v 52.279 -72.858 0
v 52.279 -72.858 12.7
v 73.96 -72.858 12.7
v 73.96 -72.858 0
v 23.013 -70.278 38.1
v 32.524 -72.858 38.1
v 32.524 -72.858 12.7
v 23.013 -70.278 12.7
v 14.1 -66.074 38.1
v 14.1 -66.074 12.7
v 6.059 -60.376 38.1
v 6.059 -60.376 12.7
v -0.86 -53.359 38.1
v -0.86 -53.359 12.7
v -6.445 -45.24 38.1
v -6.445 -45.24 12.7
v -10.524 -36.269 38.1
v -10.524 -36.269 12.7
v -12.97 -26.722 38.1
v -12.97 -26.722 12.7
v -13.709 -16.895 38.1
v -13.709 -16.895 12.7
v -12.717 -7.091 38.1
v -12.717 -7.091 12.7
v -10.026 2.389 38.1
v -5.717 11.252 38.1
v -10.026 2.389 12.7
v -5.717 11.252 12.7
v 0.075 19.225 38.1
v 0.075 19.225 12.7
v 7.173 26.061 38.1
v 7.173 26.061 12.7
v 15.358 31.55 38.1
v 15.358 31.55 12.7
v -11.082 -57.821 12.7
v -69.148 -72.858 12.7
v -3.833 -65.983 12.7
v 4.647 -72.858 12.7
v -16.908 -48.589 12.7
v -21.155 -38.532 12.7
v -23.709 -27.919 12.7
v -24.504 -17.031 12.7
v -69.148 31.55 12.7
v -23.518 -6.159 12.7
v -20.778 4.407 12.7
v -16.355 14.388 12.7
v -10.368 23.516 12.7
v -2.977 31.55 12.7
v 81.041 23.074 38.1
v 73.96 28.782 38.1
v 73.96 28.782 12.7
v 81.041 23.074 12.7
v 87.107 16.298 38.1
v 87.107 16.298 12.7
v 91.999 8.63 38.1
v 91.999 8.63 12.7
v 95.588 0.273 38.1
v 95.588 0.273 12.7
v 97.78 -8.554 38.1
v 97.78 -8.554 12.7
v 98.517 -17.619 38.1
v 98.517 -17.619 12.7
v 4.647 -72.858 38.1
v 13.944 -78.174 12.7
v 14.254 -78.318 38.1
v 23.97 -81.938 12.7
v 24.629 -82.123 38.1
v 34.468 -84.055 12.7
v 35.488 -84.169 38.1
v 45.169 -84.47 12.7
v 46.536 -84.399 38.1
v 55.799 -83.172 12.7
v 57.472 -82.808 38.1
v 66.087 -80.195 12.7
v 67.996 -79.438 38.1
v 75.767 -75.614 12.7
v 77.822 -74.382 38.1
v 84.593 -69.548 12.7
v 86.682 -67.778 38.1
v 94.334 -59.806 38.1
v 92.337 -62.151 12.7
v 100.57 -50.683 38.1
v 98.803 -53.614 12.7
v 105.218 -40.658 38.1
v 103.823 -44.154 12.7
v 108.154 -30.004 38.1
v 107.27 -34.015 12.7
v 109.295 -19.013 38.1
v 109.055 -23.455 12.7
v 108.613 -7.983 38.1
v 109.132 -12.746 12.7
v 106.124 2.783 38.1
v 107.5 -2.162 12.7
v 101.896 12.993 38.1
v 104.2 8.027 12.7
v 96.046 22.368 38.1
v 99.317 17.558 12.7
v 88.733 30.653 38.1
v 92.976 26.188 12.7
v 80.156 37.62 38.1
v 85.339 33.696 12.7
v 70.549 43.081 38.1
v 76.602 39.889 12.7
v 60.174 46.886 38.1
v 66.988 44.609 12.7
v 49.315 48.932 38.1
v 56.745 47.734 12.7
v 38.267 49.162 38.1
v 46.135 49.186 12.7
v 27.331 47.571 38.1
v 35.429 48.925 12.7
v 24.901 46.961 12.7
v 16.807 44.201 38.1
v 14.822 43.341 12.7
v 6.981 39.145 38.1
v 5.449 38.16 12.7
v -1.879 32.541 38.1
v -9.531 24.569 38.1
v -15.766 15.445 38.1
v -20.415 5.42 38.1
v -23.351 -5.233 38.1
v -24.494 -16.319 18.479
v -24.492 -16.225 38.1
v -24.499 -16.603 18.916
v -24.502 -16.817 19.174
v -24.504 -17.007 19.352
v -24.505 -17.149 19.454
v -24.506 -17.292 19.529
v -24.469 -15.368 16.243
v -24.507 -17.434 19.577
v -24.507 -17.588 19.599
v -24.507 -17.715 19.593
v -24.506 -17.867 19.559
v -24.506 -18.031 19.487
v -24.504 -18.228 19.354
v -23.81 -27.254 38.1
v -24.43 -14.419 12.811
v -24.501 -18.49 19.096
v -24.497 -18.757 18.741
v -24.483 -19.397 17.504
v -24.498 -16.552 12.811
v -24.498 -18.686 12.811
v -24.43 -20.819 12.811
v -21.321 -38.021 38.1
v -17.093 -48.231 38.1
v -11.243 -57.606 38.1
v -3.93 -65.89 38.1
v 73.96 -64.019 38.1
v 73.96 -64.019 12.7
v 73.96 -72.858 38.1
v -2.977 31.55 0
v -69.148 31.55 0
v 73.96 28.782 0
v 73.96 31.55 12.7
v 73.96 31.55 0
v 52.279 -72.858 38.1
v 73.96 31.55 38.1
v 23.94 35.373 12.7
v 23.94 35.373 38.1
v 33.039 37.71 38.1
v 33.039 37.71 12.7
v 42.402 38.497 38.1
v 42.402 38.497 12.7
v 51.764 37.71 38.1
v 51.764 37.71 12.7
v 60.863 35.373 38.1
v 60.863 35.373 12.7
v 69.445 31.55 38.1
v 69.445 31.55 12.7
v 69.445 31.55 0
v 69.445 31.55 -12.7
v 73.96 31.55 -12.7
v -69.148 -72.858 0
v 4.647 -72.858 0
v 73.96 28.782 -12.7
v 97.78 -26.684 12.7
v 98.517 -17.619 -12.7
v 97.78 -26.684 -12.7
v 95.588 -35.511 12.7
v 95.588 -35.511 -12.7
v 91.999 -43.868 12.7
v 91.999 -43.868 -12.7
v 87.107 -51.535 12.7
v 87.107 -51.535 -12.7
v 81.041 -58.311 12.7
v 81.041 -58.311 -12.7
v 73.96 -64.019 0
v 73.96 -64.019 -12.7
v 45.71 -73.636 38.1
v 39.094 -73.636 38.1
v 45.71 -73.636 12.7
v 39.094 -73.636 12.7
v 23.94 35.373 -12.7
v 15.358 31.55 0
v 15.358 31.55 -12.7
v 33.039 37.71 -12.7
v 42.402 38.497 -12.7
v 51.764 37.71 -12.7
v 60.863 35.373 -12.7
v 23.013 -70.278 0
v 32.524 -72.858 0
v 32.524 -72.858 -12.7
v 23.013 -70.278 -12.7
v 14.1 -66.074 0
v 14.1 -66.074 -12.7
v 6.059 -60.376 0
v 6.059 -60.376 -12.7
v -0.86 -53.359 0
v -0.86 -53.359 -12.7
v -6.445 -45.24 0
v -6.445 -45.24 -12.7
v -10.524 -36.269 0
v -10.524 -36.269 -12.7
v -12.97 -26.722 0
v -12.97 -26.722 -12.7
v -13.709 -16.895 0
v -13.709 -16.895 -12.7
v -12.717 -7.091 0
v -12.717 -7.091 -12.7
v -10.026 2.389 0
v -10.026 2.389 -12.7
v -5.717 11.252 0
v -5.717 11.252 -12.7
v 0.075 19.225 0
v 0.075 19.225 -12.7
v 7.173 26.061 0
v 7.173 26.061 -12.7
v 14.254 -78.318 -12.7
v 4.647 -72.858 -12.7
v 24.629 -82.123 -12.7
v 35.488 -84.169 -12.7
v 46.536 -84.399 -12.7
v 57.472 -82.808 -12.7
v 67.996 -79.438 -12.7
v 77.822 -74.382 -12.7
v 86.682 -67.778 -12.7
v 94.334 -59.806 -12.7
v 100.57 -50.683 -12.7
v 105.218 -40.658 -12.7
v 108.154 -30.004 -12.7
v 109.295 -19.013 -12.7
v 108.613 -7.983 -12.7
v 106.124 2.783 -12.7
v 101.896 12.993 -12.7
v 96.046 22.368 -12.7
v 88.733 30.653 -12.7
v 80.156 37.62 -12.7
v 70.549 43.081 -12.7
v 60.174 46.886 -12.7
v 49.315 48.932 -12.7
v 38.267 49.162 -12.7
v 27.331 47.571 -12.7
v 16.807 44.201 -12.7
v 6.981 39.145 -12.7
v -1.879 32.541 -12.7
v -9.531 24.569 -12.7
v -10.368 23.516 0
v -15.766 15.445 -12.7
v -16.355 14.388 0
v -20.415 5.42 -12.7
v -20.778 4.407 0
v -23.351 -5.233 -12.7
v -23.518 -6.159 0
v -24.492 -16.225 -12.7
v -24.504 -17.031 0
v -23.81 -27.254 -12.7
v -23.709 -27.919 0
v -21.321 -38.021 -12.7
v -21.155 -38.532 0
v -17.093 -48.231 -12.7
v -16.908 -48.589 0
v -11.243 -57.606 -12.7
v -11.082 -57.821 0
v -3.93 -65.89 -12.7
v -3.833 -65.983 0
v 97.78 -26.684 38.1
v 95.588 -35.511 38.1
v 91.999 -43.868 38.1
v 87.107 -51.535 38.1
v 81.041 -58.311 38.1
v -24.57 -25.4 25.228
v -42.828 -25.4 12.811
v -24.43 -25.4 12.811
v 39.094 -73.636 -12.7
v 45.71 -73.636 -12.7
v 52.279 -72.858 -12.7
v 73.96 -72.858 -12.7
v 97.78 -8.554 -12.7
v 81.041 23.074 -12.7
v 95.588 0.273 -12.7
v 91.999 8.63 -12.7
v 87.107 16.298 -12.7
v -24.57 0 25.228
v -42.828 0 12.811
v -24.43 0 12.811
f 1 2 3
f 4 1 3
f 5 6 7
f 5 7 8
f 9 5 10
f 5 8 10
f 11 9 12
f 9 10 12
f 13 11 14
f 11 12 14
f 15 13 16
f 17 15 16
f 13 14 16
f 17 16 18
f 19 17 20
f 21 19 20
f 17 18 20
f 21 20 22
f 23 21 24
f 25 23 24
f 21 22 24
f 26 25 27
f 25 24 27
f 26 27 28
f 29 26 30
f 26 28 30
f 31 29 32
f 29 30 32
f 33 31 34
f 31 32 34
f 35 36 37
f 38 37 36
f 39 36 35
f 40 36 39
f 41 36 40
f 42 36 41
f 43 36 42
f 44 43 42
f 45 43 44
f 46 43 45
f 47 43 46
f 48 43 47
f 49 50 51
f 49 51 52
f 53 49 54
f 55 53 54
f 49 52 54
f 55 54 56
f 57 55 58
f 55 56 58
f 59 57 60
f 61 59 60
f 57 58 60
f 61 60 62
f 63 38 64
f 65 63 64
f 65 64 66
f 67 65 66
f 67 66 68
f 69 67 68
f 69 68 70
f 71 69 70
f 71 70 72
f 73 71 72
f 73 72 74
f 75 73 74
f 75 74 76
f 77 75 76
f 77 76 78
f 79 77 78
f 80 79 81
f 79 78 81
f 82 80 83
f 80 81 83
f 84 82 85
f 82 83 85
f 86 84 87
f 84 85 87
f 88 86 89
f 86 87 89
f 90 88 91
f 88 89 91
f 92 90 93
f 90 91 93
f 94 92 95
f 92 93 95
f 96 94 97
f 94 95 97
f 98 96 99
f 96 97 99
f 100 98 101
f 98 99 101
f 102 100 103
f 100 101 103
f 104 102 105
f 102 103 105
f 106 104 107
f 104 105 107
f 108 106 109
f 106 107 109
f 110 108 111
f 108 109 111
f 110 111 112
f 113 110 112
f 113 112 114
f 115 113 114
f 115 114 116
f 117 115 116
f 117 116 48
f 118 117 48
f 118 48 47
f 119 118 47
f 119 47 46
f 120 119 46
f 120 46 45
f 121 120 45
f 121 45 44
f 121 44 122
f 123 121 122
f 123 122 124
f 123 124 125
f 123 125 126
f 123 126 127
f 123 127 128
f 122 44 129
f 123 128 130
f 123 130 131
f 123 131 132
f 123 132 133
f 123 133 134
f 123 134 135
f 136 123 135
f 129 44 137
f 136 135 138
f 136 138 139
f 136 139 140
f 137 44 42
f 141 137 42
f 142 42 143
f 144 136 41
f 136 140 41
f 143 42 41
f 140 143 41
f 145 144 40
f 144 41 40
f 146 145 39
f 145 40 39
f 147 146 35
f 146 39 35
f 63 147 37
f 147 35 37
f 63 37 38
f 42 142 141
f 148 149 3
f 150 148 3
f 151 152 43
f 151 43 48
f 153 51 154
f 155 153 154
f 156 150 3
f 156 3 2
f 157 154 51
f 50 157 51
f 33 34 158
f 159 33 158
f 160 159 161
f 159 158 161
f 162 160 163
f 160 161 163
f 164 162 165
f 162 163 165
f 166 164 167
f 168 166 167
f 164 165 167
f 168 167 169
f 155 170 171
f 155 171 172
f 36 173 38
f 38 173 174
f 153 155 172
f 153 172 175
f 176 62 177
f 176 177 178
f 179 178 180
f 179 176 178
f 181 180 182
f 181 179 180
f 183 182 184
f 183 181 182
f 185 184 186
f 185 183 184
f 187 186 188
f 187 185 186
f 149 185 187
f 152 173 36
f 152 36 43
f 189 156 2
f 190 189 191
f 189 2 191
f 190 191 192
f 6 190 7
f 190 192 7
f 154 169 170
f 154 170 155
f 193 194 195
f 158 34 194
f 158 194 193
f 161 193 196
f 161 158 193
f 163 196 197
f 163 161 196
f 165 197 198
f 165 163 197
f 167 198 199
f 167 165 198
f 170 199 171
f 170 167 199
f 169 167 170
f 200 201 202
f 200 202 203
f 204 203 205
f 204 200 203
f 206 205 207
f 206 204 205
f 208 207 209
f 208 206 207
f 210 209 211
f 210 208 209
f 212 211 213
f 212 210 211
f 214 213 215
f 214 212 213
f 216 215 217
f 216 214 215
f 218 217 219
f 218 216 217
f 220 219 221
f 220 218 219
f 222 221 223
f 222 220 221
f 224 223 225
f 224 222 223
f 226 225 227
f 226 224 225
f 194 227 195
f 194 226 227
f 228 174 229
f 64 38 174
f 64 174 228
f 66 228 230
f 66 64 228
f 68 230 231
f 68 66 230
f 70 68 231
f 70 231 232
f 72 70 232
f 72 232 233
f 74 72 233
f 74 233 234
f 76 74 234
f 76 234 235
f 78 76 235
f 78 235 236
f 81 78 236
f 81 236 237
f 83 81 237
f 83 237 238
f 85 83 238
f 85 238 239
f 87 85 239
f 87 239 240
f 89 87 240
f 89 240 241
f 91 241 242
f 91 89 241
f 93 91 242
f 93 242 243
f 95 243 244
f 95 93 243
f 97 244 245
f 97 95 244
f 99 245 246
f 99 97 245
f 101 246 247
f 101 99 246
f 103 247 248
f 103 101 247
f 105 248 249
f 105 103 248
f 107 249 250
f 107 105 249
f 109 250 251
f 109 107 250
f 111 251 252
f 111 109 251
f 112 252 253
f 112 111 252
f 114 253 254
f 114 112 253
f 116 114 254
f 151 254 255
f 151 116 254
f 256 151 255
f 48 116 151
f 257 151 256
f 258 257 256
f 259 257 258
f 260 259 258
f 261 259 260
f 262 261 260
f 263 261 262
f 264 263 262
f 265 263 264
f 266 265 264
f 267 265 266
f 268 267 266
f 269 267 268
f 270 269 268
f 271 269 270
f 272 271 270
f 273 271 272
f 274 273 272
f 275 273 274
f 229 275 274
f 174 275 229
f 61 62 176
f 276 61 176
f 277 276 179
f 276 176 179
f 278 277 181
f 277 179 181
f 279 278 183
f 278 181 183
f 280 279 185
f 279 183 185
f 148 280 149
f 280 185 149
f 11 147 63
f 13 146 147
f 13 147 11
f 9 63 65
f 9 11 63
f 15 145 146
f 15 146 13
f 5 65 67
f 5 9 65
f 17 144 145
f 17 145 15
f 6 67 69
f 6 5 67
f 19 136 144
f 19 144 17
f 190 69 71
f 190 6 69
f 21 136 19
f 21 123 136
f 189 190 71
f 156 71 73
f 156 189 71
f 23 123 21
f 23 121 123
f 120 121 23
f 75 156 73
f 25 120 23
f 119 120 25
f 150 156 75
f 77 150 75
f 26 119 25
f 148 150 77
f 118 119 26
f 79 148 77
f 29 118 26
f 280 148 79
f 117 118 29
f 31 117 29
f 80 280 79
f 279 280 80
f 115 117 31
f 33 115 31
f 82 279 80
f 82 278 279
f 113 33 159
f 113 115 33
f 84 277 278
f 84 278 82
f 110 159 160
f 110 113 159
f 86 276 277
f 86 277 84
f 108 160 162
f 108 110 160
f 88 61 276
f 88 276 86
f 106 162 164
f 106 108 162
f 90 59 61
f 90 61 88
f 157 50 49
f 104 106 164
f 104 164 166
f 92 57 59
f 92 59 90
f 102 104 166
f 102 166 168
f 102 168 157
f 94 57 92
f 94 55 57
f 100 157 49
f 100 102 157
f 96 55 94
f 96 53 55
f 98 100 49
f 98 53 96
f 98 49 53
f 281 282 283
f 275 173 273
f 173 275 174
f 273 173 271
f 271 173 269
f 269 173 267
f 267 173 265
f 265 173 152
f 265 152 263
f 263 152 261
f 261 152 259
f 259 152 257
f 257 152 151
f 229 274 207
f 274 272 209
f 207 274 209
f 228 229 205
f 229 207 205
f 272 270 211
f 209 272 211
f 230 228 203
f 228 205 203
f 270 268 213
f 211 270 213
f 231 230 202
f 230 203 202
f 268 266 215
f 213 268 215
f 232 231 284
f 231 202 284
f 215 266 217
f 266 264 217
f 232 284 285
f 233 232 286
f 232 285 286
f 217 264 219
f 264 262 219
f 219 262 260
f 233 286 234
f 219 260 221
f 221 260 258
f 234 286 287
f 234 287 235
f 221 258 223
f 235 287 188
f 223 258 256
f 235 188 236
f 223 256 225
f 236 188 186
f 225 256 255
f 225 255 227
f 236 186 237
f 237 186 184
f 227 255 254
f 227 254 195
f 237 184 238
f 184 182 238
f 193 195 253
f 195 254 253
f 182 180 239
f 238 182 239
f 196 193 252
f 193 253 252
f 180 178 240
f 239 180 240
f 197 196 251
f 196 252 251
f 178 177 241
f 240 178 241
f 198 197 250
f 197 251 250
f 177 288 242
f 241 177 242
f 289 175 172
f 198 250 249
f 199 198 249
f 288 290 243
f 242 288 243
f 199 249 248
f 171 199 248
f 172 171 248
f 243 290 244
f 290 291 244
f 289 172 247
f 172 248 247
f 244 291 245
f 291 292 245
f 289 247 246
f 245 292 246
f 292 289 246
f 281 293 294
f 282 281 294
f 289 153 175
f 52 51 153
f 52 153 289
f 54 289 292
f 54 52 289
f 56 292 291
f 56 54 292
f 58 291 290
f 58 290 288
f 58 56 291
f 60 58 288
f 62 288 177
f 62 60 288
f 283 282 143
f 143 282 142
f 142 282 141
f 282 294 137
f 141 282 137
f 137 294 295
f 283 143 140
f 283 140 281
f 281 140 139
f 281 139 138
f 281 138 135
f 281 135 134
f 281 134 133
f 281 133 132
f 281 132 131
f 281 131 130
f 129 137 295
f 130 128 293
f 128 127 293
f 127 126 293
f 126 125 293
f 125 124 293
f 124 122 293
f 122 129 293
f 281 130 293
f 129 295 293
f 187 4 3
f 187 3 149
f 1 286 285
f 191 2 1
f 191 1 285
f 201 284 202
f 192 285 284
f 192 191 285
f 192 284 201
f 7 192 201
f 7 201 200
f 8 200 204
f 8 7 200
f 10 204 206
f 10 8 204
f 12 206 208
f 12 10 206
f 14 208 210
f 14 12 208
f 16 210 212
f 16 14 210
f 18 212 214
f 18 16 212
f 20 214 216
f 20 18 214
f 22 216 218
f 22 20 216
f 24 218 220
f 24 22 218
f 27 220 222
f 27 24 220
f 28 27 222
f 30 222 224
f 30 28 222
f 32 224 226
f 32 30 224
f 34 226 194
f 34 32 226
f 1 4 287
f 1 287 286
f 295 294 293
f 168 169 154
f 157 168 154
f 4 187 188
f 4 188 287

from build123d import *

# Parameters (mm, degrees)
F0_W          = 143.1075930595
F0_H          = 104.4075153768
F1_DEPTH      = 12.7
F3_DEPTH      = 25.4
F3_DEPTH_BACK = 25.4
F4_DEPTH      = 25.4
F6_DEPTH      = 25.4


with BuildPart() as f1:
    # F0 (on Top) → F1 (new body)
    with BuildSketch(Plane.XY):
        with Locations((2.4059638381, -20.6538233906)):
            Rectangle(F0_W, F0_H)
    extrude(amount=F1_DEPTH)

    # F2 (on face) → F3 (join, two sides)
    with BuildSketch(Plane.XY.offset(12.7)) as f3_sk:
        with BuildLine():
            Line((15.3577672787, 31.5499342978), (-2.9768298588, 31.5499342978))
            ThreePointArc((-2.9768298588, 31.5499342978), (-24.3292867036, -22.491323871), (4.6469989905, -72.857581079))
            Line((4.6469989905, -72.857581079), (32.5235698655, -72.857581079))
            ThreePointArc((32.5235698655, -72.857581079), (-12.9702679448, -26.7224080826), (15.3577672787, 31.5499342978))
        make_face()
        with BuildLine():
            ThreePointArc((4.6469989905, -72.857581079), (73.6316913936, -76.7914525658), (109.3100037632, -17.6186449826))
            ThreePointArc((109.3100037632, -17.6186449826), (69.2394439219, 43.6714076224), (-2.9768298588, 31.5499342978))
            Line((-2.9768298588, 31.5499342978), (15.3577672787, 31.5499342978))
            ThreePointArc((15.3577672787, 31.5499342978), (42.4015261233, 38.4965408489), (69.4452849679, 31.5499342978))
            Line((69.4452849679, 31.5499342978), (73.9597603679, 31.5499342978))
            Line((73.9597603679, 31.5499342978), (73.9597603679, 28.7816991138))
            ThreePointArc((73.9597603679, 28.7816991138), (91.9989568029, 8.6303350143), (98.5167119547, -17.6186449826))
            ThreePointArc((98.5167119547, -17.6186449826), (91.9989568029, -43.8676249794), (73.9597603679, -64.0189890789))
            Line((73.9597603679, -64.0189890789), (73.9597603679, -72.857581079))
            Line((73.9597603679, -72.857581079), (52.279482381, -72.857581079))
            ThreePointArc((52.279482381, -72.857581079), (42.4015261233, -73.733830814), (32.5235698655, -72.857581079))
            Line((32.5235698655, -72.857581079), (4.6469989905, -72.857581079))
        make_face()
    extrude(amount=F3_DEPTH)
    extrude(f3_sk.sketch, amount=-F3_DEPTH_BACK)

    # F4 (cut): a face of the model
    f4_faces = [f1.faces().sort_by_distance(p)[0] for p in [
        (34.4480932251, -19.6254541978, 12.7),
    ]]
    extrude(f4_faces, amount=-F4_DEPTH, mode=Mode.SUBTRACT)

    # F5 (on Front) → F6 (join)
    with BuildSketch(Plane.XZ):
        Polygon((-24.4303904474, 12.8110842779), (-24.5704315603, 25.2280384302), (-42.8279539842, 12.8110842779), align=None)
    extrude(amount=F6_DEPTH)


solid = f1.part
